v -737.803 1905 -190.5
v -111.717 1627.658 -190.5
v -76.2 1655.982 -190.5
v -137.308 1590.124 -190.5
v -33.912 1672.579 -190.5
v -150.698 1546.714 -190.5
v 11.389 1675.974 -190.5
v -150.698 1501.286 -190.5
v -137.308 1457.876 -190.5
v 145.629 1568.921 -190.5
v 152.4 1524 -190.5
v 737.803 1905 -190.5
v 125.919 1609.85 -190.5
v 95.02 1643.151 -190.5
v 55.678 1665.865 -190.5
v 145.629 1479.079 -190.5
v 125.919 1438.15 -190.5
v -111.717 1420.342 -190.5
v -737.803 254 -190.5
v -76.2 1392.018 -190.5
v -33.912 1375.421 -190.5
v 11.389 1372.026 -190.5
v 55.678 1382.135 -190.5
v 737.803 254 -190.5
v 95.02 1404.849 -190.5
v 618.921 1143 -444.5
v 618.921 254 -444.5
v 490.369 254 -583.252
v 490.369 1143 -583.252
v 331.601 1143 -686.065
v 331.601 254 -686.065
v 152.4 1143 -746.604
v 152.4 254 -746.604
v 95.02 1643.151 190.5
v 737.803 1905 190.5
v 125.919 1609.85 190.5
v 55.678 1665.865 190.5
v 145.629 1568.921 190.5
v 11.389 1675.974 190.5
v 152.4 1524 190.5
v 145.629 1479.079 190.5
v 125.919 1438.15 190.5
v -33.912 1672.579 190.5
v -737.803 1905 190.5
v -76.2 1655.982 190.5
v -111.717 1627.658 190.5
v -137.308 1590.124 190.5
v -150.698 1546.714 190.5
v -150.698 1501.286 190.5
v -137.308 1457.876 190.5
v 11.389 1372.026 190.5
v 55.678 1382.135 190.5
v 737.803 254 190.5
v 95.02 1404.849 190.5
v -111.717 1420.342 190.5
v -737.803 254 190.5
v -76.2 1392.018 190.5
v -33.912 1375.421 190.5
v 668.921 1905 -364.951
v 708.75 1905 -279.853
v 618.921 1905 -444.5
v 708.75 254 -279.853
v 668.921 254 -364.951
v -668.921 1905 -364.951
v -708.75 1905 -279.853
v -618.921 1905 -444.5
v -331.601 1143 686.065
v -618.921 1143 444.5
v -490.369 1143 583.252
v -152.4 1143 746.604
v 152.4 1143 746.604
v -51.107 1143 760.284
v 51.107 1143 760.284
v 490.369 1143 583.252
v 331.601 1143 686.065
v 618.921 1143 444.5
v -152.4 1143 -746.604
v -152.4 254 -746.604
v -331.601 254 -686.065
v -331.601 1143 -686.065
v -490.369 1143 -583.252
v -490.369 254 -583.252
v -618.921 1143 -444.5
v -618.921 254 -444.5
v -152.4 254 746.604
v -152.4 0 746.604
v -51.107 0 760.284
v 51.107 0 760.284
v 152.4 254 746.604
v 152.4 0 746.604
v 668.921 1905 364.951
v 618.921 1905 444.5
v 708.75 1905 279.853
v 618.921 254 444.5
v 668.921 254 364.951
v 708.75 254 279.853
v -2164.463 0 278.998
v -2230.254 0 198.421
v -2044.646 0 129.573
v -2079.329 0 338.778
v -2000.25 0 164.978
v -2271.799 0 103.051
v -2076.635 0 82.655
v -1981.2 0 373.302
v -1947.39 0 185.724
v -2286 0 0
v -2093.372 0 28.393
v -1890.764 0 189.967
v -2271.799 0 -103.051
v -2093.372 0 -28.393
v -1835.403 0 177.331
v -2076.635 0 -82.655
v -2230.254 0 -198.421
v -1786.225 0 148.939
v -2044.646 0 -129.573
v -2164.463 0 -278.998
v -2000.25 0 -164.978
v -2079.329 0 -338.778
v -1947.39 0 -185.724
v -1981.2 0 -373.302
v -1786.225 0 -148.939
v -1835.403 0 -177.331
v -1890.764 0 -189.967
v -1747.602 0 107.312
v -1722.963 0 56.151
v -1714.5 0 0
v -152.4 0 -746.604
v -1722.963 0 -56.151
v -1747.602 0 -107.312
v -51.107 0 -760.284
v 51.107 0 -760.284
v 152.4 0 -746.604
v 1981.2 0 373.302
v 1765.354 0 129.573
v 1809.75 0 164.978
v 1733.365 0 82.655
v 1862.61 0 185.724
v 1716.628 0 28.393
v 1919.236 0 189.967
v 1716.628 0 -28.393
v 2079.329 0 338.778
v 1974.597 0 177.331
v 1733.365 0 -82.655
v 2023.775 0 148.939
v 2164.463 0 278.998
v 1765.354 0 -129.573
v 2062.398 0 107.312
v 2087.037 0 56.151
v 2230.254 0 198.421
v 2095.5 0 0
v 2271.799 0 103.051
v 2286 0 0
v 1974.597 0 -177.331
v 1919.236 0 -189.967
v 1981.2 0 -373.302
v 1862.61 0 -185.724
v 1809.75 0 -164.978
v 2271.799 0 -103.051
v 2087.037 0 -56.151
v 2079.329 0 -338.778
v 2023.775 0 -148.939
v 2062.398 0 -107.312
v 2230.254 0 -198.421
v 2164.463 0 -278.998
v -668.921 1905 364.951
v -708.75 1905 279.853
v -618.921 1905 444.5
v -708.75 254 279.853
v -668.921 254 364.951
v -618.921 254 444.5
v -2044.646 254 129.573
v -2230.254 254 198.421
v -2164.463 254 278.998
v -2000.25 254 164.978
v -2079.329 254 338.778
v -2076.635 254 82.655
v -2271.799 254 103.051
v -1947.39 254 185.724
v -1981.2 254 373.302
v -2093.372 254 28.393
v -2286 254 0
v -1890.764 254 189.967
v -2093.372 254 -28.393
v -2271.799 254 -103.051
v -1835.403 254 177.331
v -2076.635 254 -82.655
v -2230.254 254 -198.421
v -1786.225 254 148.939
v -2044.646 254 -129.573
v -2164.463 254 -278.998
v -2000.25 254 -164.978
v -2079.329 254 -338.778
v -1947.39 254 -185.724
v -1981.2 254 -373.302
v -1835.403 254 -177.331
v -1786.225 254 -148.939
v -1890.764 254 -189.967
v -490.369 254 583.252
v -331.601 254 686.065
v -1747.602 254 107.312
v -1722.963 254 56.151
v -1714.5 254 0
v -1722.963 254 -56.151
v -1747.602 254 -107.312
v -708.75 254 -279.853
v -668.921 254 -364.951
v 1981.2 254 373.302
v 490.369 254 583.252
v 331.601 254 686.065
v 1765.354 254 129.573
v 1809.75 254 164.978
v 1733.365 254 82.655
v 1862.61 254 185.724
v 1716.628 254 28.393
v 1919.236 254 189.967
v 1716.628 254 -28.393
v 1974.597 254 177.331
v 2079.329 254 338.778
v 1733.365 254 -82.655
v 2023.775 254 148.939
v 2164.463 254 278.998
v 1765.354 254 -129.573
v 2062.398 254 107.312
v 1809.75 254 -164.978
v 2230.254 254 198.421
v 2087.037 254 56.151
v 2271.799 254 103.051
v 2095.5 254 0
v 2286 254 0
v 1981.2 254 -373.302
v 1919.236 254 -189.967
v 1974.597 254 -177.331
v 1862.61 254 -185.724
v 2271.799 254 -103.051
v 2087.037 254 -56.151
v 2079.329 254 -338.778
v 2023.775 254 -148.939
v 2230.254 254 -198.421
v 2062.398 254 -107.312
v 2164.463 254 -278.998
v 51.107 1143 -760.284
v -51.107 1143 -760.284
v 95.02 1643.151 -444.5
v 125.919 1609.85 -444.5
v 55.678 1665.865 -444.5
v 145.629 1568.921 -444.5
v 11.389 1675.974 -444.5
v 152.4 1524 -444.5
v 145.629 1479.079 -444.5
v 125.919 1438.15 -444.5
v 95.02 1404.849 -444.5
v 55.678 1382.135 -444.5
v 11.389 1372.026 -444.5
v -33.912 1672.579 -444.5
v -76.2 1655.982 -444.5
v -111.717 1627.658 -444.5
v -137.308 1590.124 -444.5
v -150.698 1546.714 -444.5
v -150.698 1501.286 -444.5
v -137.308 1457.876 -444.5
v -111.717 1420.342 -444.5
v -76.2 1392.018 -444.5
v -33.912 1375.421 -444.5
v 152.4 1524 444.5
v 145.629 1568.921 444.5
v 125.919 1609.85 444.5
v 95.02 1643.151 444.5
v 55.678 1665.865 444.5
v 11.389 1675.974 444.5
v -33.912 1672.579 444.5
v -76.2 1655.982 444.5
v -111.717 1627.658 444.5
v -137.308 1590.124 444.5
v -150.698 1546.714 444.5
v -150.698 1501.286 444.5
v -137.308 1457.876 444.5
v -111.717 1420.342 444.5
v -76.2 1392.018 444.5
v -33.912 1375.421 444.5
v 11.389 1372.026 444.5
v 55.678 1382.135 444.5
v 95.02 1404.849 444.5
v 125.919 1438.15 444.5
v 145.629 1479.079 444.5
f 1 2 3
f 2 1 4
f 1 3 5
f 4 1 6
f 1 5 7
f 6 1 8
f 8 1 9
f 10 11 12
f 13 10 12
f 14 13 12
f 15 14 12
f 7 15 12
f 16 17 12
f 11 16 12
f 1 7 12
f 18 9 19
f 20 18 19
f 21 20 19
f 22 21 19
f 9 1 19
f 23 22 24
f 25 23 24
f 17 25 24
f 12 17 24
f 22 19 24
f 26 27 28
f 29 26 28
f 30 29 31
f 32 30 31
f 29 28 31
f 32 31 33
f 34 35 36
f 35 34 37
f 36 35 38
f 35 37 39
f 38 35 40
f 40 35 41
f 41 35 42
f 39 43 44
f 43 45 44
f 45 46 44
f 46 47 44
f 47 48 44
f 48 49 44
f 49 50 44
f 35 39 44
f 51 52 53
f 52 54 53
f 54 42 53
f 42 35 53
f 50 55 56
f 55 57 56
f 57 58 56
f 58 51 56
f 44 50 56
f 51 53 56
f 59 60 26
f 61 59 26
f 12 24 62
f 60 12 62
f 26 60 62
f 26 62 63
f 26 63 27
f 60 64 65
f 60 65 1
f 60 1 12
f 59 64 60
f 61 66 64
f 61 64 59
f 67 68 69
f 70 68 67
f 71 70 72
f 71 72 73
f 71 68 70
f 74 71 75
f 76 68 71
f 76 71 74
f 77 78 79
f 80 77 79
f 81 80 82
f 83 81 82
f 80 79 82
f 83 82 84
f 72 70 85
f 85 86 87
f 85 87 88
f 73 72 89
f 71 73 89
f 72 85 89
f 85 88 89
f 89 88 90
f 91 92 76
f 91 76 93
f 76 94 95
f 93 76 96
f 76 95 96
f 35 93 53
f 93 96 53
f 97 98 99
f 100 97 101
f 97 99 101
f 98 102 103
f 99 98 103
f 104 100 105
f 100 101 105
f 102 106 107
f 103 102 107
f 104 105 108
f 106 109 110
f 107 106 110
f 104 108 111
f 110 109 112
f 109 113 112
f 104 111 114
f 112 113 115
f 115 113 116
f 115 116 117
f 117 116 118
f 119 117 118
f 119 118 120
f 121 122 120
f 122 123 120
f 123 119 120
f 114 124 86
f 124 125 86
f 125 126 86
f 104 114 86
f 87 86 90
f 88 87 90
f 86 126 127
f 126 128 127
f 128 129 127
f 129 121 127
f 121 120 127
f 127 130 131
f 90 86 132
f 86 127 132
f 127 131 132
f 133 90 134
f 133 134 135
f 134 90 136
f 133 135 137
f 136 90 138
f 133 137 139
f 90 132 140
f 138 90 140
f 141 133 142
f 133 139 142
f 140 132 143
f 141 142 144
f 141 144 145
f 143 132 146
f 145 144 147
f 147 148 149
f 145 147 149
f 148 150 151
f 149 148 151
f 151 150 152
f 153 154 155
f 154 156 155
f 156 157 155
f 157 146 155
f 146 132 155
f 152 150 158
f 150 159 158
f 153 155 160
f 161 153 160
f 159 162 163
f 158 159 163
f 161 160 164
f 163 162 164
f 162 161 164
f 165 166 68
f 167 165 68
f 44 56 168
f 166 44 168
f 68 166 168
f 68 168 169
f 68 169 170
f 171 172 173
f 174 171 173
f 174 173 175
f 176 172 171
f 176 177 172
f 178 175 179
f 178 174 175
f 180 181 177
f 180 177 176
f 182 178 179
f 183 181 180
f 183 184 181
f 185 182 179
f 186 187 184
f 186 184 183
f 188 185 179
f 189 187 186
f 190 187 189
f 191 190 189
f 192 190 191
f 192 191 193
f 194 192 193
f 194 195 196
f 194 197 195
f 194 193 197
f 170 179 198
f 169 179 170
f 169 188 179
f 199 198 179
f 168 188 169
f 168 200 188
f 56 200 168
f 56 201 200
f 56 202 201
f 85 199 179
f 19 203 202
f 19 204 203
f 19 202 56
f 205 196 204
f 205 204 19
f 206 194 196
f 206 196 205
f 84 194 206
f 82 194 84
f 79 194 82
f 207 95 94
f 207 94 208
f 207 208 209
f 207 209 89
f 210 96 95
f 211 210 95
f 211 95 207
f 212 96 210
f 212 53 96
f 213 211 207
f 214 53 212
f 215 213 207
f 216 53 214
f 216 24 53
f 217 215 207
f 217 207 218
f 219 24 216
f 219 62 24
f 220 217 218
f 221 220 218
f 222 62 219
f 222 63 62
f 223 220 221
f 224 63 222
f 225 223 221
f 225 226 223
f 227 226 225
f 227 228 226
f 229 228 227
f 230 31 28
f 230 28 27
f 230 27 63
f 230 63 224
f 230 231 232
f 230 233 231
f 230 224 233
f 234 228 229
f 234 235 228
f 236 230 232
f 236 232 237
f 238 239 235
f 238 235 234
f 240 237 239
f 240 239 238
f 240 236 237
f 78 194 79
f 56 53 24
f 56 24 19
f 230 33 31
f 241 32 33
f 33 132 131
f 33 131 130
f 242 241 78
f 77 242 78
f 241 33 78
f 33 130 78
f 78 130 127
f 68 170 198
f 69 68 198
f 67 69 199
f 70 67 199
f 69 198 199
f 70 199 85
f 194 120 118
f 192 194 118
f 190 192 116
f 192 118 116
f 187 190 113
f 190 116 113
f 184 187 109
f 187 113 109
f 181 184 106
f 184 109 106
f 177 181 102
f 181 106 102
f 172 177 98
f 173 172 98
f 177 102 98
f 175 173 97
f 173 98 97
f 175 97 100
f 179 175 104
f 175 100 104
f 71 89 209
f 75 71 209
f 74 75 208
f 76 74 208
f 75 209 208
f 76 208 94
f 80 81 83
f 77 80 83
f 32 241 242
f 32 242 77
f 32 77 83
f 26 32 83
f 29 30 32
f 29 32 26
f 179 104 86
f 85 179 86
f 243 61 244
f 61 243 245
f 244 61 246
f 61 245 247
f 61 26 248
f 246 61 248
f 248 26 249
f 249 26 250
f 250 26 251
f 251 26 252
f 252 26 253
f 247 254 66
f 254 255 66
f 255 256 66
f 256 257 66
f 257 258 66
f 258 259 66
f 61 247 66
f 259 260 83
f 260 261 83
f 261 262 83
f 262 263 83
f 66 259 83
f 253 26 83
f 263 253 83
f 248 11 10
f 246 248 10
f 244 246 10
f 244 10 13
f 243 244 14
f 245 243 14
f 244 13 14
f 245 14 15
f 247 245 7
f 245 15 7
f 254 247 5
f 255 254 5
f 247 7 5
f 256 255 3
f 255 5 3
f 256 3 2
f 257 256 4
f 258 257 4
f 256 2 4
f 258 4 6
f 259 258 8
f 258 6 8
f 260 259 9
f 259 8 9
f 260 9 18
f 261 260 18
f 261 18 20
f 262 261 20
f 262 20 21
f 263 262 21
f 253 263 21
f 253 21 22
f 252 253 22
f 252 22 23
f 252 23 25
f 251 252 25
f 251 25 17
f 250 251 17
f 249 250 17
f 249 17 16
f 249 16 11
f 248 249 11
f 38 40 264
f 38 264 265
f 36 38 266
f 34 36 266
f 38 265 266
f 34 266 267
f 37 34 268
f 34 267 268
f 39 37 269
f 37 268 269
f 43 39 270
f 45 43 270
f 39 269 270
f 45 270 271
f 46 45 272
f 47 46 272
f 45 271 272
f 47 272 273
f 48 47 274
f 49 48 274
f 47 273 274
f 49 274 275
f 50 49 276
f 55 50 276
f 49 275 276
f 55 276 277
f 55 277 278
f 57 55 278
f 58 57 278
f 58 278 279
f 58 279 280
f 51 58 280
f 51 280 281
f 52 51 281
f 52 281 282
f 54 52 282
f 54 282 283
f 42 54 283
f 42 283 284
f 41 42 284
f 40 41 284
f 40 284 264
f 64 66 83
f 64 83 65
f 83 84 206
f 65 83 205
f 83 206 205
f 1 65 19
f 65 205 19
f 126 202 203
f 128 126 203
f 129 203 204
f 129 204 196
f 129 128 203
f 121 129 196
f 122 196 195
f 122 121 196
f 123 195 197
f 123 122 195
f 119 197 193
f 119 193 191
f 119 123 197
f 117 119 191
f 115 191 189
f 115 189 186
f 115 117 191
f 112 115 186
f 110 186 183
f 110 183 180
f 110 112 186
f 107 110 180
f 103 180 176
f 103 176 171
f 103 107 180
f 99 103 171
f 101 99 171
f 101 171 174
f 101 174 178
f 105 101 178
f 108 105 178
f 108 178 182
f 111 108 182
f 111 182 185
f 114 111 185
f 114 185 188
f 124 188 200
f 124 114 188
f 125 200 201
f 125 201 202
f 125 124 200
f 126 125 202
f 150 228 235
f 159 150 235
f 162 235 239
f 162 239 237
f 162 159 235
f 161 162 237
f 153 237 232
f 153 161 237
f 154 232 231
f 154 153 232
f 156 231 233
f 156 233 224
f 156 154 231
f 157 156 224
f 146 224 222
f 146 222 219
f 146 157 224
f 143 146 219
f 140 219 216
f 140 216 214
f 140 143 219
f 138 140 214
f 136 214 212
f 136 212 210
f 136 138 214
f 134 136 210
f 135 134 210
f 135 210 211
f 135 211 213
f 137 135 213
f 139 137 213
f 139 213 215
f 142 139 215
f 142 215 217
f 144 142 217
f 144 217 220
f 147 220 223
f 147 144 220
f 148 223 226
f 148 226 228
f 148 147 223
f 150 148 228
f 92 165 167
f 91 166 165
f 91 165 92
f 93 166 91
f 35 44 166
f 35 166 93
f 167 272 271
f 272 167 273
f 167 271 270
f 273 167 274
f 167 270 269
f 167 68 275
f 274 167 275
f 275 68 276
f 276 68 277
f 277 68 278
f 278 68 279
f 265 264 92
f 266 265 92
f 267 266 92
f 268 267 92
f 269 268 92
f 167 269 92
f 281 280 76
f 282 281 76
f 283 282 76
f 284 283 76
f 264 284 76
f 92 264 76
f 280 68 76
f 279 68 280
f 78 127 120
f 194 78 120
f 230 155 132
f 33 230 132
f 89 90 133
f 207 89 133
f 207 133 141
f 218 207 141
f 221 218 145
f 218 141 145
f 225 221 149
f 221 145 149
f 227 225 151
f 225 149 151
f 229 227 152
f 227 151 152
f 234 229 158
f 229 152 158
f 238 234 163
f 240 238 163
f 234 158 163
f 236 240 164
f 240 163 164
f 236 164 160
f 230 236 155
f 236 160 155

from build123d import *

# Parameters (mm, degrees)
BOSS_EXTRUDE1_DEPTH   = 1905
BOSS_EXTRUDE1_2_DEPTH = 1905
BOSS_EXTRUDE2_DEPTH   = 1143
SKETCH3_4_R           = 190.5
BOSS_EXTRUDE3_DEPTH   = 254
SKETCH4_R             = 152.4
CUT_EXTRUDE1_DEPTH    = 1264.92


with BuildPart() as part:
    # Sketch3 → Boss-Extrude1 (new body)
    with BuildSketch(Plane(origin=(0, 0, 0), x_dir=(1, 0, 0), z_dir=(0, 1, 0))):
        with BuildLine():
            Line((618.921440895, 444.5), (-618.921440895, 444.5))
            ThreePointArc((-618.921440895, 444.5), (-690.148190074, 323.016215905), (-737.803327453, 190.5))
            Line((-737.803327453, 190.5), (737.803327453, 190.5))
            ThreePointArc((737.803327453, 190.5), (690.148190074, 323.016215905), (618.921440895, 444.5))
        make_face()
    extrude(amount=BOSS_EXTRUDE1_DEPTH)



with BuildPart() as body_2:
    # Sketch3 → Boss-Extrude1 2 (new body)
    with BuildSketch(Plane(origin=(0, 0, 0), x_dir=(1, 0, 0), z_dir=(0, 1, 0))):
        with BuildLine():
            ThreePointArc((-737.803327453, -190.5), (-690.148190074, -323.016215905), (-618.921440895, -444.5))
            Line((-618.921440895, -444.5), (618.921440895, -444.5))
            ThreePointArc((618.921440895, -444.5), (690.148190074, -323.016215905), (737.803327453, -190.5))
            Line((737.803327453, -190.5), (-737.803327453, -190.5))
        make_face()
    extrude(amount=BOSS_EXTRUDE1_2_DEPTH)


with BuildPart() as part_1:
    add(part.part)

    add(body_2.part)  # Boss-Extrude2 merges body 2
    # Sketch3<3> → Boss-Extrude2 (add)
    with BuildSketch(Plane(origin=(0, 0, 0), x_dir=(1, 0, 0), z_dir=(0, 1, 0))):
        with BuildLine():
            ThreePointArc((618.921440895, 444.5), (0, 762), (-618.921440895, 444.5))
            Line((-618.921440895, 444.5), (618.921440895, 444.5))
        make_face()
        with BuildLine():
            ThreePointArc((-618.921440895, -444.5), (0, -762), (618.921440895, -444.5))
            Line((618.921440895, -444.5), (-618.921440895, -444.5))
        make_face()
    extrude(amount=BOSS_EXTRUDE2_DEPTH)

    # Sketch3<4> → Boss-Extrude3 (add)
    with BuildSketch(Plane(origin=(0, 0, 0), x_dir=(1, 0, 0), z_dir=(0, 1, 0))):
        with BuildLine():
            ThreePointArc((-618.921440895, 444.5), (-414.187118992, 639.603807416), (-152.4, 746.6044736))
            Line((-152.4, 746.6044736), (-1981.2, 373.3022368))
            ThreePointArc((-1981.2, 373.3022368), (-2286, 0), (-1981.2, -373.3022368))
            Line((-1981.2, -373.3022368), (-152.4, -746.6044736))
            ThreePointArc((-152.4, -746.6044736), (-414.187118992, -639.603807416), (-618.921440895, -444.5))
            ThreePointArc((-618.921440895, -444.5), (-690.148190074, -323.016215905), (-737.803327453, -190.5))
            Line((-737.803327453, -190.5), (737.803327453, -190.5))
            ThreePointArc((737.803327453, -190.5), (690.148190074, -323.016215905), (618.921440895, -444.5))
            ThreePointArc((618.921440895, -444.5), (414.187118992, -639.603807416), (152.4, -746.6044736))
            Line((152.4, -746.6044736), (1981.2, -373.3022368))
            ThreePointArc((1981.2, -373.3022368), (2286, 0), (1981.2, 373.3022368))
            Line((1981.2, 373.3022368), (152.4, 746.6044736))
            ThreePointArc((152.4, 746.6044736), (414.187118992, 639.603807416), (618.921440895, 444.5))
            ThreePointArc((618.921440895, 444.5), (690.148190074, 323.016215905), (737.803327453, 190.5))
            Line((737.803327453, 190.5), (-737.803327453, 190.5))
            ThreePointArc((-737.803327453, 190.5), (-690.148190074, 323.016215905), (-618.921440895, 444.5))
        make_face()
        with Locations((-1905, 0)):
            Circle(SKETCH3_4_R, mode=Mode.SUBTRACT)
        with Locations((1905, 0)):
            Circle(SKETCH3_4_R, mode=Mode.SUBTRACT)
    extrude(amount=BOSS_EXTRUDE3_DEPTH)

    # Sketch4 → Cut-Extrude1 (cut)
    with BuildSketch(Plane.XY.offset(444.5)):
        with Locations((0, 1524)):
            Circle(SKETCH4_R)
    extrude(amount=-CUT_EXTRUDE1_DEPTH, mode=Mode.SUBTRACT)


solid = part_1.part
